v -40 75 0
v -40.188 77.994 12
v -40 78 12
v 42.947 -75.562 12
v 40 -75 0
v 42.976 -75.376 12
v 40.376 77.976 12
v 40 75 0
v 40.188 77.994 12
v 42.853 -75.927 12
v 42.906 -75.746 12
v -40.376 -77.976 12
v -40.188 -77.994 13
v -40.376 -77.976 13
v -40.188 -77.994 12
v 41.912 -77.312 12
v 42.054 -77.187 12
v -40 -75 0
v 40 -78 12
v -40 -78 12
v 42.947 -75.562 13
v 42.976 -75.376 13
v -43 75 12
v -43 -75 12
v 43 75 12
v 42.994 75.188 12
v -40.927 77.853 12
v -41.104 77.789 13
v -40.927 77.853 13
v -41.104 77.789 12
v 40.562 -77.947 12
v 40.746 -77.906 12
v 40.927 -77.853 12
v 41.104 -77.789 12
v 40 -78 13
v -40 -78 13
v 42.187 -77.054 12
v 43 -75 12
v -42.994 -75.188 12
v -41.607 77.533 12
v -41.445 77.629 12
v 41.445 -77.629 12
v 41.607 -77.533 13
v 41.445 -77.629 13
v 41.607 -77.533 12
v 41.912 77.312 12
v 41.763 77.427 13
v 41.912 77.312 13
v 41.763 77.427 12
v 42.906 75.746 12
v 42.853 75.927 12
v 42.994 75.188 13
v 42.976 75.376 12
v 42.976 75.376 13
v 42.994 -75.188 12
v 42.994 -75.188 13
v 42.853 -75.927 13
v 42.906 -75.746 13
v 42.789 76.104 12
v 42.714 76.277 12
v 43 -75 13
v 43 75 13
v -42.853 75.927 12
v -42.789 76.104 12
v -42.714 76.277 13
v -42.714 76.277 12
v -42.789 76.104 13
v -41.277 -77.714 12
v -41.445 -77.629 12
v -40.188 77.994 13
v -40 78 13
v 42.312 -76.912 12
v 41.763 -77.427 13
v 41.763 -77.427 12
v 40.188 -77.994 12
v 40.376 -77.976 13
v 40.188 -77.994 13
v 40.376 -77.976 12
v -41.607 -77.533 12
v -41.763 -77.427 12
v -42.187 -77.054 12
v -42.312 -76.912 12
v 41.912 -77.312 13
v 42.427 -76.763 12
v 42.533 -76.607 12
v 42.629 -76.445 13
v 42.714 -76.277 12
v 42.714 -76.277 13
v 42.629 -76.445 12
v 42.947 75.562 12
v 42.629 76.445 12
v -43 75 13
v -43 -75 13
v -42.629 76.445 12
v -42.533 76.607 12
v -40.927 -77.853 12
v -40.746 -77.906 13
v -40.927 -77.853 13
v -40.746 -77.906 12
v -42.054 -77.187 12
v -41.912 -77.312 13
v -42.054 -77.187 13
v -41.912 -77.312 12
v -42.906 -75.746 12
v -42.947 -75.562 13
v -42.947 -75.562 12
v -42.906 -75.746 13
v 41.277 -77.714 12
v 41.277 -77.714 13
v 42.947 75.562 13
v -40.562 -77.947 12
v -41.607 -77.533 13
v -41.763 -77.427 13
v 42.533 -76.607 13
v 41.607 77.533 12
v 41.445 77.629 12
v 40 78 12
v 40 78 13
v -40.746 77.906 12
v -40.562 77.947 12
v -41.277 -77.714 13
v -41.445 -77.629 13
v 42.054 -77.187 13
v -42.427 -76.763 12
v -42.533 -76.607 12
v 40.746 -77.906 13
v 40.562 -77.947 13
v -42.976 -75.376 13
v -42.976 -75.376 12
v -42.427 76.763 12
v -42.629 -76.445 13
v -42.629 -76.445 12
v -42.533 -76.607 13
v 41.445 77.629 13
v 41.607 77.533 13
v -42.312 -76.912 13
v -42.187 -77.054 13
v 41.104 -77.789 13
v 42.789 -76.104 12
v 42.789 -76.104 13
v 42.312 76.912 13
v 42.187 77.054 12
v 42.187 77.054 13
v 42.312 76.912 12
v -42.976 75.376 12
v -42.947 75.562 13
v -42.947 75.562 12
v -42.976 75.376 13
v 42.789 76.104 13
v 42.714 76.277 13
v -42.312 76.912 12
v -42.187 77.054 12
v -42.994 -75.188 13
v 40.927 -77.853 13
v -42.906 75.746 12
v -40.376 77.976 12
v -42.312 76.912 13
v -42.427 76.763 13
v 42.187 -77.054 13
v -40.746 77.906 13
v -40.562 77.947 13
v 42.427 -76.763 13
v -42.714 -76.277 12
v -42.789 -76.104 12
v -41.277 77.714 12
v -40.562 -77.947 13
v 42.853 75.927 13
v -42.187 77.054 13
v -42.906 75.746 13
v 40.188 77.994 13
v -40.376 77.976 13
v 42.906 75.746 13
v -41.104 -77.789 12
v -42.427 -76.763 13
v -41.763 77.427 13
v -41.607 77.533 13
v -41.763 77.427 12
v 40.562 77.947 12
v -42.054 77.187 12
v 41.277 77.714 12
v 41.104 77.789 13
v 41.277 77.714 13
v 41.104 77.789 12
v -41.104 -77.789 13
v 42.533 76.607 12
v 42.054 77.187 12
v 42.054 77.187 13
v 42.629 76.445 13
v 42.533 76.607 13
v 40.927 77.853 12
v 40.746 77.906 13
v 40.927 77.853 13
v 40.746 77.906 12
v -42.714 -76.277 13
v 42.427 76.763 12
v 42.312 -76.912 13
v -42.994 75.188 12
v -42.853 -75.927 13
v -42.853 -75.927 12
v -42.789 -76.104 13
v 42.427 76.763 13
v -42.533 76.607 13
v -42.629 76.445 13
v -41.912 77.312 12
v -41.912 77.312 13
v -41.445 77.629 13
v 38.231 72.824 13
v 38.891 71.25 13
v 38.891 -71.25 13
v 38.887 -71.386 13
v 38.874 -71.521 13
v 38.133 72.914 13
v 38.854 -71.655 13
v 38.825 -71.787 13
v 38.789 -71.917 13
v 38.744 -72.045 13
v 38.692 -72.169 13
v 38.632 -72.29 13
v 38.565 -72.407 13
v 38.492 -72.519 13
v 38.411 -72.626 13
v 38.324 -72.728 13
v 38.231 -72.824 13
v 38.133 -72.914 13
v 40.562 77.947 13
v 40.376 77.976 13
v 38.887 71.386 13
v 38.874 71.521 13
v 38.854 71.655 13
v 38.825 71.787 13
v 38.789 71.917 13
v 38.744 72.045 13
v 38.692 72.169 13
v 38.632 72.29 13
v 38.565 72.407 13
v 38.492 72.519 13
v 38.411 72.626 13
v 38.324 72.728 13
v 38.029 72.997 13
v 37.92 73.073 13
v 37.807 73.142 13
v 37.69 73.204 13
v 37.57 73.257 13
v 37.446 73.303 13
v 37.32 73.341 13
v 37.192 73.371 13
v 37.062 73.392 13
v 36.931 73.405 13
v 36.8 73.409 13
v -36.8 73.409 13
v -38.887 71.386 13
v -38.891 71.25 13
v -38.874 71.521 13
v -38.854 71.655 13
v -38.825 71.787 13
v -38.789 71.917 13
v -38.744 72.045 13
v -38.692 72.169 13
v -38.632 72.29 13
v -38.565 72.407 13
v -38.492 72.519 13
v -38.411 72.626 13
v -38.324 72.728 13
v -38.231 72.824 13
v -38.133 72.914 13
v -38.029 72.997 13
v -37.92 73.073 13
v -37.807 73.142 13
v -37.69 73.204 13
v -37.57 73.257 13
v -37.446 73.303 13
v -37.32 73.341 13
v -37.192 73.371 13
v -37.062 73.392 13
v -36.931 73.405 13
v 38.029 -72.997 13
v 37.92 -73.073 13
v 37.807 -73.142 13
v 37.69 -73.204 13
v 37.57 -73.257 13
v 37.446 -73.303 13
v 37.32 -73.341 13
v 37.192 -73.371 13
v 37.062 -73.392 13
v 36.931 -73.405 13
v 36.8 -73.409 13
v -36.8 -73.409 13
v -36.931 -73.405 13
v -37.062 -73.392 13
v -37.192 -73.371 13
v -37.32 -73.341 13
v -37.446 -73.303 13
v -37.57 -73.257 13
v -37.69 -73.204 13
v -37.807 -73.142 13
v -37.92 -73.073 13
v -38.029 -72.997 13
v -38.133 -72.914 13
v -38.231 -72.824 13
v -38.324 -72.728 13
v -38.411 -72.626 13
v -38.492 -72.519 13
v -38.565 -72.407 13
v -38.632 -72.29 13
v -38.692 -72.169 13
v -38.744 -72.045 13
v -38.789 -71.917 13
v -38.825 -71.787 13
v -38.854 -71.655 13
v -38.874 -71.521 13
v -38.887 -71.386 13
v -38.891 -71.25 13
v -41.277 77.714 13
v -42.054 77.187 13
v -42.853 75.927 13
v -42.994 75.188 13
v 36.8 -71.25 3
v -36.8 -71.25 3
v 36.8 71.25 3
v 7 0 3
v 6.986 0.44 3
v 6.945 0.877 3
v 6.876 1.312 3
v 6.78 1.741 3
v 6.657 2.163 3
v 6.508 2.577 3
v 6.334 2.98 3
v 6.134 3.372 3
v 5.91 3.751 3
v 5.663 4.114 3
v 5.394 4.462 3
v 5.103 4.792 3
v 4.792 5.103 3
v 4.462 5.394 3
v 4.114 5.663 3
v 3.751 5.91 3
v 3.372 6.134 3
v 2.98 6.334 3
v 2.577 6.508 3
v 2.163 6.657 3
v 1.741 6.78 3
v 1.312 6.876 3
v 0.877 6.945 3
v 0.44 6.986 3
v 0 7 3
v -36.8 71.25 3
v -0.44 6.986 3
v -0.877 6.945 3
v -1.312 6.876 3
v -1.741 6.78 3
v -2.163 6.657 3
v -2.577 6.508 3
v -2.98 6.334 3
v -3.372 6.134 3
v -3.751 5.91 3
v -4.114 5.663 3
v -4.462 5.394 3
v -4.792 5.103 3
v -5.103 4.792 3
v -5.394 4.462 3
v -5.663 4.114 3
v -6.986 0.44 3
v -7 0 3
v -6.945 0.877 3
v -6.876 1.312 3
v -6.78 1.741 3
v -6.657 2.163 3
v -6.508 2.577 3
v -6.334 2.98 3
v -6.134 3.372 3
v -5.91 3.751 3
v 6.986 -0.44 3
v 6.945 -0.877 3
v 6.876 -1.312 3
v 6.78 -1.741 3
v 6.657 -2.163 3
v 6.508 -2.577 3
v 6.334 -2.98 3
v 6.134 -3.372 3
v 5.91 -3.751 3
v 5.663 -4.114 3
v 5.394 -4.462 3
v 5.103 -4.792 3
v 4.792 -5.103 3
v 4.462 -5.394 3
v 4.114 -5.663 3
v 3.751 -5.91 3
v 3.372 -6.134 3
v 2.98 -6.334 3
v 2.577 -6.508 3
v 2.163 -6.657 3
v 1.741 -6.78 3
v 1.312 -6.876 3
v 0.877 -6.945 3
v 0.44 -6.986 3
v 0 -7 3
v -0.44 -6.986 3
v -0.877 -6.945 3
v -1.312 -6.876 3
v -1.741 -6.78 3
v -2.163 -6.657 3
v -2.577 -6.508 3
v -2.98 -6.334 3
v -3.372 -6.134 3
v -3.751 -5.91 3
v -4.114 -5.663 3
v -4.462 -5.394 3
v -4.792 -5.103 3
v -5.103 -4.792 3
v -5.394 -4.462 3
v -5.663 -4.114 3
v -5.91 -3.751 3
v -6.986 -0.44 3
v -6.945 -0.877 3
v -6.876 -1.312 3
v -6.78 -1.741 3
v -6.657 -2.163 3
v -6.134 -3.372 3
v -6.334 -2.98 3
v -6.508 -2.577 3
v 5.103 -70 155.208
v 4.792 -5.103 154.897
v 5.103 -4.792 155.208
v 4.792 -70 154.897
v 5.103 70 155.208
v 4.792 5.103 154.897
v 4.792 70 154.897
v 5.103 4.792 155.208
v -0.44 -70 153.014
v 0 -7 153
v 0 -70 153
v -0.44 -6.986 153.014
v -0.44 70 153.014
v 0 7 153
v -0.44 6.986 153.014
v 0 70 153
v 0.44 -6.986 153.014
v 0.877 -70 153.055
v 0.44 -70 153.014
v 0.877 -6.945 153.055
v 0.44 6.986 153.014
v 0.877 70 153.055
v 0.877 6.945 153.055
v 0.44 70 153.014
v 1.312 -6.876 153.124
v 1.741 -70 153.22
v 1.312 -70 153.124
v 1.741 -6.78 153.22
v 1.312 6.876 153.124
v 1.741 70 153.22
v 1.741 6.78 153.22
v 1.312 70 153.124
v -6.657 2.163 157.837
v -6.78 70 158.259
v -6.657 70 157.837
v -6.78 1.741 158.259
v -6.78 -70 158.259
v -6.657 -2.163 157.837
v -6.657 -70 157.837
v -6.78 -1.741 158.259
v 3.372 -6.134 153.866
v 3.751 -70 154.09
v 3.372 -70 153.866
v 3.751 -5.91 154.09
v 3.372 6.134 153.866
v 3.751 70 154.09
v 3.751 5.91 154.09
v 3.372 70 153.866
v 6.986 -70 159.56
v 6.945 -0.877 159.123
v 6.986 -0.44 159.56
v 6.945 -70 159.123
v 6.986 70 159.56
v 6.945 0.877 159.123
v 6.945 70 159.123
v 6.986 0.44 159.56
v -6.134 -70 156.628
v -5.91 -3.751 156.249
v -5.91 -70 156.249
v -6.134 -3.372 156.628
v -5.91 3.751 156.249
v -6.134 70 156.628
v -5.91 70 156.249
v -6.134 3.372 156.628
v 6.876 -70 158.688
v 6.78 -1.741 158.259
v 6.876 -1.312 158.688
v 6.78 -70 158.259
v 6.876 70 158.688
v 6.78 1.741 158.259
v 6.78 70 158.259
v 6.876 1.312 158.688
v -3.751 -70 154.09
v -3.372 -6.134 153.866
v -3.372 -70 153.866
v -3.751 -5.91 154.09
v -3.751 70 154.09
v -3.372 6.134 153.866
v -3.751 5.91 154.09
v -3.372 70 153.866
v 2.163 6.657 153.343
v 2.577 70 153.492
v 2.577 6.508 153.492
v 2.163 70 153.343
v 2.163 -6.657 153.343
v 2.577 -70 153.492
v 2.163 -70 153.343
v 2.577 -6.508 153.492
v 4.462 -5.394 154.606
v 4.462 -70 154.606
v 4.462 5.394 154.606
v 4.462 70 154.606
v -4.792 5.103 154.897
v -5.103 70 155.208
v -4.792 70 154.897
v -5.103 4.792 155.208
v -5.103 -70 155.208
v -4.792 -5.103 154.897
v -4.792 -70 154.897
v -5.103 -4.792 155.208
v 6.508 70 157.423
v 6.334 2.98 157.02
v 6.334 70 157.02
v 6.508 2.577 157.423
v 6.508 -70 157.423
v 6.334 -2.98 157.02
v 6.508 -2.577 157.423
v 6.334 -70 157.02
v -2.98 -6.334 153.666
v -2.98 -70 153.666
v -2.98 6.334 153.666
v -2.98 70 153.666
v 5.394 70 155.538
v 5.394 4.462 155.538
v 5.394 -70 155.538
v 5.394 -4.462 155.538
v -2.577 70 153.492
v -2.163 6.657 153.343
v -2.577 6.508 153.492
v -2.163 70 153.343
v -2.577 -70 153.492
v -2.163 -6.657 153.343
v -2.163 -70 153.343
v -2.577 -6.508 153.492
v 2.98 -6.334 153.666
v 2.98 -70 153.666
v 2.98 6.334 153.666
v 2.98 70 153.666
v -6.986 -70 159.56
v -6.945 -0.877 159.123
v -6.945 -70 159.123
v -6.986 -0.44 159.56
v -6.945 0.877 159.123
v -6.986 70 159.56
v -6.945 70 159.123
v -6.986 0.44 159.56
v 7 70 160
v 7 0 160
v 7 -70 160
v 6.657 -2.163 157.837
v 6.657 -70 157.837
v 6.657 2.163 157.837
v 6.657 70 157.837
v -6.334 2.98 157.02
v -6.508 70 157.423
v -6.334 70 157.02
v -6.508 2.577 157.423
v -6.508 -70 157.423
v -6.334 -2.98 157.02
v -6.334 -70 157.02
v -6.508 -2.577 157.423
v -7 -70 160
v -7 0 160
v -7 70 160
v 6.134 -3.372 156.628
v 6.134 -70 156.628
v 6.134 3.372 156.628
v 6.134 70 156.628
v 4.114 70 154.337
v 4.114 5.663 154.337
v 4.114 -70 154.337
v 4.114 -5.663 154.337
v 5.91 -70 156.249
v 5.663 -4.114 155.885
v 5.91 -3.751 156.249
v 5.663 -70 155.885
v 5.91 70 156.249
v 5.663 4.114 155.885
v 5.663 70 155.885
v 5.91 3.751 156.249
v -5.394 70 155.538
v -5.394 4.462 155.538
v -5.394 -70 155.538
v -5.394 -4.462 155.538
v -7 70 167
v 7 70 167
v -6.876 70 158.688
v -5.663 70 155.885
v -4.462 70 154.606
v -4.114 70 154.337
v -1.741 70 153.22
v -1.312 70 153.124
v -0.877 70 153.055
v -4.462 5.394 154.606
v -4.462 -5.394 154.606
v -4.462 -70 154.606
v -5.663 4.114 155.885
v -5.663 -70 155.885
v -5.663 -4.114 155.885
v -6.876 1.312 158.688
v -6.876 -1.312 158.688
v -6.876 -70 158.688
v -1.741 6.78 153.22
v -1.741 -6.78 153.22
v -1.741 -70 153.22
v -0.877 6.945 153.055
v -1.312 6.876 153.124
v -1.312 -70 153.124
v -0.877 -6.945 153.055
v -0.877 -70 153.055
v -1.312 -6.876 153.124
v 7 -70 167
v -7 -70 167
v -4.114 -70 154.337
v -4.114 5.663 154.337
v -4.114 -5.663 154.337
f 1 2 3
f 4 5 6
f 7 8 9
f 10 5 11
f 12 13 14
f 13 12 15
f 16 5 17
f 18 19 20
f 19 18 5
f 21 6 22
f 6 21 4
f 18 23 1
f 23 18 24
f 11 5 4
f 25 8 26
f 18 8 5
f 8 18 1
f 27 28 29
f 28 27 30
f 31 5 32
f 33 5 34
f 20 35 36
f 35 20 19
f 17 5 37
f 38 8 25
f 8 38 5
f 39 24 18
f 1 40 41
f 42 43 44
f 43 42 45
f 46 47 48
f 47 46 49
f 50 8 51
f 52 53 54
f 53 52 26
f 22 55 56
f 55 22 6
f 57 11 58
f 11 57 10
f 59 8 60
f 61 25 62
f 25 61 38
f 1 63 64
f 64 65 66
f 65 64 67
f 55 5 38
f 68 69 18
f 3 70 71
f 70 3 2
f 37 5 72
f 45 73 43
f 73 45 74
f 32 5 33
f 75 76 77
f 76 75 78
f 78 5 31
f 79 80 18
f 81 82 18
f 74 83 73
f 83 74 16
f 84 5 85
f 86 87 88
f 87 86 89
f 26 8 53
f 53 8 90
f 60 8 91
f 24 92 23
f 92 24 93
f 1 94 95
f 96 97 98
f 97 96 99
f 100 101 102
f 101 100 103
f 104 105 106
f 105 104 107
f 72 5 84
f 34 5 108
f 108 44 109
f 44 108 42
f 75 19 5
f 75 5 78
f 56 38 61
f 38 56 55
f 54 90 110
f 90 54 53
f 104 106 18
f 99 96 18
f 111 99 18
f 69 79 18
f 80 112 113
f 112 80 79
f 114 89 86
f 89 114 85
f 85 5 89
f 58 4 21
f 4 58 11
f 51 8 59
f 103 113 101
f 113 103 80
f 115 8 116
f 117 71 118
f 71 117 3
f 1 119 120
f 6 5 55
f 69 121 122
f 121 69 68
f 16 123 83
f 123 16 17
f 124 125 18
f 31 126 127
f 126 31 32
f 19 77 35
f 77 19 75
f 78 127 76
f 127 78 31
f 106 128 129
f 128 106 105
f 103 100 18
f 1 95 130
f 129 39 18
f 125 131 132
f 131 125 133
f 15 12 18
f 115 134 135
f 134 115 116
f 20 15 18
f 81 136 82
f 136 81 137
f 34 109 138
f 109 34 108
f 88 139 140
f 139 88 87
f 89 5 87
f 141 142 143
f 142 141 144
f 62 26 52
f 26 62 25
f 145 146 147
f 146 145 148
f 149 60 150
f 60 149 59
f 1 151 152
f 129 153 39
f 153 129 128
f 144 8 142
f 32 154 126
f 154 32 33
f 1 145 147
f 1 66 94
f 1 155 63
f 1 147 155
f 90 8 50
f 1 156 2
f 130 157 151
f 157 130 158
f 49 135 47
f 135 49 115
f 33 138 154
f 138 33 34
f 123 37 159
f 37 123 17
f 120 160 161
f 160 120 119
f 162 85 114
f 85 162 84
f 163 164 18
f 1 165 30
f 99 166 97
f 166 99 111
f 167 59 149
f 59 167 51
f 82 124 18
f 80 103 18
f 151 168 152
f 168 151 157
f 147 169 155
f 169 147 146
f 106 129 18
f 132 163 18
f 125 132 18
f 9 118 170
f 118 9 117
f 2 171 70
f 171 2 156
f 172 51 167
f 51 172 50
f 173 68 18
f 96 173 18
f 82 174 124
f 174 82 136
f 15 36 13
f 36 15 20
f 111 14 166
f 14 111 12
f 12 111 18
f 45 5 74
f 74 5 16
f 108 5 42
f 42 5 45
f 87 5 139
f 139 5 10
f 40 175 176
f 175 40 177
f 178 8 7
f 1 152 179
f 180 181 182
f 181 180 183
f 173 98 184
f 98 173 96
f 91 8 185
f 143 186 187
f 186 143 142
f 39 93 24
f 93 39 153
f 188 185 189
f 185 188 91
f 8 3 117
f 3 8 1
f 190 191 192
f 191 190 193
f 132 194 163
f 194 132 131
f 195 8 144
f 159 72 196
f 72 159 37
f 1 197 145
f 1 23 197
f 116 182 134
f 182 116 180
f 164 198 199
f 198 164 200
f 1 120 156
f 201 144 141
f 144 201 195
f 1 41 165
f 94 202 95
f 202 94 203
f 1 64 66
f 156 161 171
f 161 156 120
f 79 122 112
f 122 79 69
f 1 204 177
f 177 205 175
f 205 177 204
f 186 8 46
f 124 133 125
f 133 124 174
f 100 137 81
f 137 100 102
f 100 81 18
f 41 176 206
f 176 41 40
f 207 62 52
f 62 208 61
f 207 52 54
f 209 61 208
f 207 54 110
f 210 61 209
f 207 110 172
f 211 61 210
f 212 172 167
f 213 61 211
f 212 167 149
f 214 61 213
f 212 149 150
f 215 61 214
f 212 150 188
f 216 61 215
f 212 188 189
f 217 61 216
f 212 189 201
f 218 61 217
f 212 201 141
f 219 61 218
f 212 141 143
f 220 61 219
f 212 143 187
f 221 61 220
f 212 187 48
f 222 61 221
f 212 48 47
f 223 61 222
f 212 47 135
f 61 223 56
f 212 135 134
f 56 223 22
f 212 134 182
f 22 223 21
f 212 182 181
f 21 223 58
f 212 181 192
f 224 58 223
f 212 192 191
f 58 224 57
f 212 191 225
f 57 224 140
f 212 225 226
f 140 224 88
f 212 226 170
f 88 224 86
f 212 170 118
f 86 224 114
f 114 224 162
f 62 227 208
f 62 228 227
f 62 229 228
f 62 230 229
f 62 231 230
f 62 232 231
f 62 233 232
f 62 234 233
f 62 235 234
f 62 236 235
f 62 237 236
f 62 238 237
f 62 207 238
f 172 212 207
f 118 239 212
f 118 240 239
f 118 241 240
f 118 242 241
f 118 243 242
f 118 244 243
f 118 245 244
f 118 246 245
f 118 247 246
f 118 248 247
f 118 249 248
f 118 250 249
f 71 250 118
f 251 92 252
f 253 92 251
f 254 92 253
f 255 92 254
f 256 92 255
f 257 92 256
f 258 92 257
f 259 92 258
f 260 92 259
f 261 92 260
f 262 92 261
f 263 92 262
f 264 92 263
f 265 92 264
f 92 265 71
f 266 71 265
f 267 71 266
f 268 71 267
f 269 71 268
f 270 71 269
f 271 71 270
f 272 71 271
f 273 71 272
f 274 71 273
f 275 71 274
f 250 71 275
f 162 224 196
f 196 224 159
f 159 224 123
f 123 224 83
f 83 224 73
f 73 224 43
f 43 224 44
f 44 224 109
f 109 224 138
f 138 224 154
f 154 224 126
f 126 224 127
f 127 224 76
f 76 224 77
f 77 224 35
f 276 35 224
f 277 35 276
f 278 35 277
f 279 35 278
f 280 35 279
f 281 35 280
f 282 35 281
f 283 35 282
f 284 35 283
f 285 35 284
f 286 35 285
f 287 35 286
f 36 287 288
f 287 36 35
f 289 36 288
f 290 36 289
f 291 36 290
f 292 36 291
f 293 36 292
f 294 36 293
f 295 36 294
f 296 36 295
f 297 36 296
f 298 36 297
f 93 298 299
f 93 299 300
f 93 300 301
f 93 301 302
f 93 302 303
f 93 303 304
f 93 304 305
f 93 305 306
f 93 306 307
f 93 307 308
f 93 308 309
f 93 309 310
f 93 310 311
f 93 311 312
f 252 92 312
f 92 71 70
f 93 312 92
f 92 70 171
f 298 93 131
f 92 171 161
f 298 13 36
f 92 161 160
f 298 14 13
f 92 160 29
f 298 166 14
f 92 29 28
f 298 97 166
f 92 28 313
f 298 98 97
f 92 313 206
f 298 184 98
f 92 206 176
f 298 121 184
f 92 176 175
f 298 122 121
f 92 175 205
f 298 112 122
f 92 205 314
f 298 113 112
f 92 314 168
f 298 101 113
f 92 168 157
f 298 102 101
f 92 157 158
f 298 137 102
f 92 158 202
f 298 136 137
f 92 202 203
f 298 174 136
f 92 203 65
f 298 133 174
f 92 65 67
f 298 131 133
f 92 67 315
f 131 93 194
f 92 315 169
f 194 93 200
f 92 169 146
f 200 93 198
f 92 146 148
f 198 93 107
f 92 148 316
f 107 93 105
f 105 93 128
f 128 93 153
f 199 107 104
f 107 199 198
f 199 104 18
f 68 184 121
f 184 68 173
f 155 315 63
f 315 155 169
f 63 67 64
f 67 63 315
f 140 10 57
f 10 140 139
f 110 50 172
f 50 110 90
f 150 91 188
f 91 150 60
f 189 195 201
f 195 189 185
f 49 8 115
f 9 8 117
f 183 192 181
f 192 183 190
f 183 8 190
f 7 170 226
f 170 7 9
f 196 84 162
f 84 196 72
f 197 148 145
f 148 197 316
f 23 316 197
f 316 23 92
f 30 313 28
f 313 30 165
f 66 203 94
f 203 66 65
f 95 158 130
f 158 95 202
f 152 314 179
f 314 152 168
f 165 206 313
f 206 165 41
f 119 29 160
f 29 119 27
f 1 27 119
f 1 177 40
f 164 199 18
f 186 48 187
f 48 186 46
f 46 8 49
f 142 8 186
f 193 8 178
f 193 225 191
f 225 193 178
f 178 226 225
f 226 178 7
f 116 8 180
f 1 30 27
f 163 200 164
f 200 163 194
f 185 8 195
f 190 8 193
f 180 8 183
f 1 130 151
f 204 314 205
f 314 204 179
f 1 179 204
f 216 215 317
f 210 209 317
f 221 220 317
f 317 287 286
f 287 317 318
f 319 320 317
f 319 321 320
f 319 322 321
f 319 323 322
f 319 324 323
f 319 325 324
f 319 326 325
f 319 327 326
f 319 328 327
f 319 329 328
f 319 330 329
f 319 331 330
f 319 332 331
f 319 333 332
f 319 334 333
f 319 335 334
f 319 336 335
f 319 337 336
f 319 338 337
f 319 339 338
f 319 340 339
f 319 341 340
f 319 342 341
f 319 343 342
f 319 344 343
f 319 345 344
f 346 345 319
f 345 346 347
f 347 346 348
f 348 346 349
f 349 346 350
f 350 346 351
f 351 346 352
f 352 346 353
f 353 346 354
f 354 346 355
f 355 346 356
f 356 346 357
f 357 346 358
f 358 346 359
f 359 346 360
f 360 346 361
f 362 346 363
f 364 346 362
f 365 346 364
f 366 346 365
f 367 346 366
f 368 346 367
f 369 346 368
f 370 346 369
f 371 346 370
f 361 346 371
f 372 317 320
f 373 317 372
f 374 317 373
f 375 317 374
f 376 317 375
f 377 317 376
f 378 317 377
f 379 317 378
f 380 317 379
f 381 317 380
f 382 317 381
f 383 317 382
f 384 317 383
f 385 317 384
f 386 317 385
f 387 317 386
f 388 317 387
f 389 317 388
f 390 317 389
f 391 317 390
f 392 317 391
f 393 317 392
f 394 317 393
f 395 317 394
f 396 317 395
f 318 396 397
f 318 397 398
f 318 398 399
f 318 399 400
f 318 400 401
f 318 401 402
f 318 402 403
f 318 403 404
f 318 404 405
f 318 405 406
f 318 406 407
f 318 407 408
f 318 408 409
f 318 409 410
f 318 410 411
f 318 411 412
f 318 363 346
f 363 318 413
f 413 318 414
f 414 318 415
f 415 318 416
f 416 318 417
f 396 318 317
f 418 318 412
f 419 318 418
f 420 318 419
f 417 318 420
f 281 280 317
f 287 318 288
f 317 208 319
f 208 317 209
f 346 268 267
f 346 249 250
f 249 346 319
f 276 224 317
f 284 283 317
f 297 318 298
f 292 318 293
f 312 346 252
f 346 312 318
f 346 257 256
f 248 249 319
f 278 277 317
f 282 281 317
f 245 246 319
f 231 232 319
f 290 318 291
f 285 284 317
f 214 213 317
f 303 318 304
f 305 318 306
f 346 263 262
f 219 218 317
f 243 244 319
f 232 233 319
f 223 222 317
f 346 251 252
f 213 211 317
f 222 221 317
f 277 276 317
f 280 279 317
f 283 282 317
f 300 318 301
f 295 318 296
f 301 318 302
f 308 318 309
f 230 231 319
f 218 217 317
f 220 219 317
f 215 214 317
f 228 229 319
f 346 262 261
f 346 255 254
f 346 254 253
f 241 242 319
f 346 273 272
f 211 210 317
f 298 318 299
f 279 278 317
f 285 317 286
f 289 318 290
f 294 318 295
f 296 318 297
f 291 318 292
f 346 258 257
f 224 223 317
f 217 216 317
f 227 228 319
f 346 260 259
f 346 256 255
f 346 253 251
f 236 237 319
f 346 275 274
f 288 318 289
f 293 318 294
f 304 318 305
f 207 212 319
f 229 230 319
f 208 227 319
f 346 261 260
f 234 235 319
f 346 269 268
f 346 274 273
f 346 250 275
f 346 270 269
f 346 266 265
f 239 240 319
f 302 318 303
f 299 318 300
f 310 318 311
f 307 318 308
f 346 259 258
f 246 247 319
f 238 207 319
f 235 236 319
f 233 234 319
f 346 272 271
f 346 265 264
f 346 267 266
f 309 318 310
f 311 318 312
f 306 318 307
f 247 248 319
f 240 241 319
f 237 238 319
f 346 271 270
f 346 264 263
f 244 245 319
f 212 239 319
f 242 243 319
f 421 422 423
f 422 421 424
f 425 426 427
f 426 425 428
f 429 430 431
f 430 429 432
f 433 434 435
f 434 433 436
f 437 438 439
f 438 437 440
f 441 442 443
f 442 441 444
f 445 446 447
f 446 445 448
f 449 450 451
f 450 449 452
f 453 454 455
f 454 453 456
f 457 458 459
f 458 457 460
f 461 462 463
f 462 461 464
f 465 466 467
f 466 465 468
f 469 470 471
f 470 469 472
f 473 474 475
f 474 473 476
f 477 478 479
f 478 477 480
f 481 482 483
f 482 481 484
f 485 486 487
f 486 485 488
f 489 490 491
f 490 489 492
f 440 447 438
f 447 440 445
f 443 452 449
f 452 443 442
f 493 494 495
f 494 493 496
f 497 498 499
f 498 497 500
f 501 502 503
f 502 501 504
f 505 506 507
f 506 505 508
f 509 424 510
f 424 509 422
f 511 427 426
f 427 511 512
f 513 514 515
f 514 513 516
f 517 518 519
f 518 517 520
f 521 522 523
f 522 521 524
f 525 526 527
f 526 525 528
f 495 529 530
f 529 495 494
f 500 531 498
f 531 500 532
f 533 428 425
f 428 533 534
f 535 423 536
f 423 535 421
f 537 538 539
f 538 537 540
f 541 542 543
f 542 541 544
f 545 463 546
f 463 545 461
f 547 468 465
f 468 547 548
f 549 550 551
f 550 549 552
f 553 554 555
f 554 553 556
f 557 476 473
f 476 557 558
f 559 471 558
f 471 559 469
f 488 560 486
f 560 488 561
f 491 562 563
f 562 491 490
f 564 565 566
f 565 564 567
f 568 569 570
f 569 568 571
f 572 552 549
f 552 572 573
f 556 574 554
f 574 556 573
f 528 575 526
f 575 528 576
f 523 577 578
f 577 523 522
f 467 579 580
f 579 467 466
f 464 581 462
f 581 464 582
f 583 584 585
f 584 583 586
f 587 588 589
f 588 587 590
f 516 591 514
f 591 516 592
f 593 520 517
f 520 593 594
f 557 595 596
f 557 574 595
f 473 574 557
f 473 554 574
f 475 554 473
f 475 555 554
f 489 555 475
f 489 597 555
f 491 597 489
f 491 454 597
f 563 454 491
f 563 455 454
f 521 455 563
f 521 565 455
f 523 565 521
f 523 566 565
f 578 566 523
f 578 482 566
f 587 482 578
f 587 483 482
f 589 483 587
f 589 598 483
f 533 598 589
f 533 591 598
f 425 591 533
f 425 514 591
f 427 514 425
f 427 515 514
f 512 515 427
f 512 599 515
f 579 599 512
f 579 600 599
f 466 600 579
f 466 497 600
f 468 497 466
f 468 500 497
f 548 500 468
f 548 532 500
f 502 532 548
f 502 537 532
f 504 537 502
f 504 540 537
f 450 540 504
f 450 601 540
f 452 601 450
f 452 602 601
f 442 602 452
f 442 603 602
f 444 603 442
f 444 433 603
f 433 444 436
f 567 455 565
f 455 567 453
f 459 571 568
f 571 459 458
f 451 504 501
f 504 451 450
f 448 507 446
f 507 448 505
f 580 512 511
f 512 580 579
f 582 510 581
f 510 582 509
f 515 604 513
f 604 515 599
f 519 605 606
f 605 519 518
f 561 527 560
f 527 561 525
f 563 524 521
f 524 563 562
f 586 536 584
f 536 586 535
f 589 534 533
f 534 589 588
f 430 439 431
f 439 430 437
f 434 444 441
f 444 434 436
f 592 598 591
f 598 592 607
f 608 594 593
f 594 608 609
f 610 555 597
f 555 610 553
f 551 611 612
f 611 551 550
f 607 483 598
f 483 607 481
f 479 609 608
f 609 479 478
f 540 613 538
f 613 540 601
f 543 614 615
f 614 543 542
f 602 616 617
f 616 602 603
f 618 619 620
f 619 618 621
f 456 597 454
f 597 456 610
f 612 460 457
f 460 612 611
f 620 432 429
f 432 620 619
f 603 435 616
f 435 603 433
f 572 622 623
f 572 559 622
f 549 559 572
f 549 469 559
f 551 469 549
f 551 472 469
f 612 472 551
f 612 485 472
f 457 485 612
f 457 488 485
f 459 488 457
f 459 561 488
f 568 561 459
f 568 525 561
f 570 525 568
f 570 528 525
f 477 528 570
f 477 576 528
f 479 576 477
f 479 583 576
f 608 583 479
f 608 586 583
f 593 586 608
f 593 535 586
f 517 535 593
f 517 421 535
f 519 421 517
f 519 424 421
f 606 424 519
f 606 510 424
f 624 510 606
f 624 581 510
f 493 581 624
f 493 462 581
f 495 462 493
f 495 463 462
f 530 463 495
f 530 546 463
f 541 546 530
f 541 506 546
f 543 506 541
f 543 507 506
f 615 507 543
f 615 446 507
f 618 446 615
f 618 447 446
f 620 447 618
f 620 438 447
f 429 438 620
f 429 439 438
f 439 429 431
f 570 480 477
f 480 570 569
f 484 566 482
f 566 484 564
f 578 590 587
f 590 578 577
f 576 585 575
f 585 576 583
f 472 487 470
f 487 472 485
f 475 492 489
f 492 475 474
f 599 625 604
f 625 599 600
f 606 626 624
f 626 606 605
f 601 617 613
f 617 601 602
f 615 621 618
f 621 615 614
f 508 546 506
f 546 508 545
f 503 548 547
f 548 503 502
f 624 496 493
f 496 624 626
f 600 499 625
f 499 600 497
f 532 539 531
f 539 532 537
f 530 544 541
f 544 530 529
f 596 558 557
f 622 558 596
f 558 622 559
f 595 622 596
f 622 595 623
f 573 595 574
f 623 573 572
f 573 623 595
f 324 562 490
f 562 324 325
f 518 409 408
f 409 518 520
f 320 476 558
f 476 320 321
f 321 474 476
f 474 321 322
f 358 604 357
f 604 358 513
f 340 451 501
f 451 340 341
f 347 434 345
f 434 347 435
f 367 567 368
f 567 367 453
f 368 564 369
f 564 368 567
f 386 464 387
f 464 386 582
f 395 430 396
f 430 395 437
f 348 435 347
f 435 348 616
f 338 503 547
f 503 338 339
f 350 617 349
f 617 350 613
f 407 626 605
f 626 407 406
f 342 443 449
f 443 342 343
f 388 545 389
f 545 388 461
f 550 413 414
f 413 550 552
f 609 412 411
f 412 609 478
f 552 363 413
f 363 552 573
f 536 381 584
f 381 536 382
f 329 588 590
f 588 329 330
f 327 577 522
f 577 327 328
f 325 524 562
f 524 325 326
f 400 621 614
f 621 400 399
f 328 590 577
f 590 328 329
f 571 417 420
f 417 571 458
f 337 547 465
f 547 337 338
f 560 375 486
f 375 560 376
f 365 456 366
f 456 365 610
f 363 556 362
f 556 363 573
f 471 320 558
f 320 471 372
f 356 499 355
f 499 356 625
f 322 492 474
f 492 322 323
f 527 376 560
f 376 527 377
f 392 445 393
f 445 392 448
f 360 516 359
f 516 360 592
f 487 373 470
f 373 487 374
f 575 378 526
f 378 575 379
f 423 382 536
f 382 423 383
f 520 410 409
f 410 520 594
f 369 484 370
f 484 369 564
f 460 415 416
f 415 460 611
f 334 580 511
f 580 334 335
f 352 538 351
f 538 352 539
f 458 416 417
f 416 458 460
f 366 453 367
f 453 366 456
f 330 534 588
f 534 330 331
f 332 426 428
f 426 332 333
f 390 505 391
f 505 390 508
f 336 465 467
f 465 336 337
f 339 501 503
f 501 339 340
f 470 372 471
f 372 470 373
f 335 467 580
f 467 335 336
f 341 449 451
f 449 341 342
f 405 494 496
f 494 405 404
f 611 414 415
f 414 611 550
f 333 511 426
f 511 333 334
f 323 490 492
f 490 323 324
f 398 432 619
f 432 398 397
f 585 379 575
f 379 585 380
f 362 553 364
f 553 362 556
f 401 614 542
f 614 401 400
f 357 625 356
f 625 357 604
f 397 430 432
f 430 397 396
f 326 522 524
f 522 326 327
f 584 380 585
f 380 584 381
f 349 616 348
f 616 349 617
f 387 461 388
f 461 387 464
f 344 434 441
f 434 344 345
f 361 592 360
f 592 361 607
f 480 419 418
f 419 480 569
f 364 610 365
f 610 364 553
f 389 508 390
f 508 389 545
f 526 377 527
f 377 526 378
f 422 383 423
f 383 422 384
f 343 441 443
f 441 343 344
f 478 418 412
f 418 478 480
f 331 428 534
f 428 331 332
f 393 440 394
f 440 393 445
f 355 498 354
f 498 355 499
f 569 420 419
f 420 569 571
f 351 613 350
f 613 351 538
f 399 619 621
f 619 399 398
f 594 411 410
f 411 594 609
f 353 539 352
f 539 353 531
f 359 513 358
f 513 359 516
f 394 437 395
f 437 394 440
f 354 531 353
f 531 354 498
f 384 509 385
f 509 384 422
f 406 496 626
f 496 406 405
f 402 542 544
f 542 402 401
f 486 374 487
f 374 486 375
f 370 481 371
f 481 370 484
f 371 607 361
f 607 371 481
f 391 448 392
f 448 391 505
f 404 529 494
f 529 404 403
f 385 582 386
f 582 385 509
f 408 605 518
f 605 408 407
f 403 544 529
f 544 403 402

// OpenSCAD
$fn=100;
base_length=80;
base_width=150;
base_height=12;
base_thickness=3;
//module base() {
//    translate([0, base_width/2, base_r])
//    rotate([90,0,0])
//    cylinder(h=base_width, r=base_r);
//    translate([-base_r,-base_width/2,0])
//    cube([base_r*2,base_width, base_r]);
//}
//base();

module base() {
    translate([-base_length/2, -base_width/2,0])
    cube([base_length, base_width, base_thickness]);
}

module lip() {
    difference() {
        offset(r=3)
        projection()
        base();
        projection()
        base();
    }
}

module solid_tray() {
    hull() {
        base();
        translate([0,0,base_height])
        linear_extrude(height=1)
        lip();
    }
}

module hollowed_tray() {
    difference() {
        solid_tray();
        translate([0,0,base_thickness])
        scale([0.92,0.95,1.1])
        solid_tray();
    }
}

hollowed_tray();

neck_height=160;
neck_r=7;
module neck() {
    cylinder(h=neck_height, r=neck_r);
}
neck();

tbar_width=140;
tbar_r=7;
module tbar() {
    translate([0, tbar_width/2, neck_height])
    rotate([90,0,0])
    cylinder(h=tbar_width, r=tbar_r);
    translate([-tbar_r,-tbar_width/2,neck_height])
    cube([tbar_r*2,tbar_width, tbar_r]);
}
tbar();
